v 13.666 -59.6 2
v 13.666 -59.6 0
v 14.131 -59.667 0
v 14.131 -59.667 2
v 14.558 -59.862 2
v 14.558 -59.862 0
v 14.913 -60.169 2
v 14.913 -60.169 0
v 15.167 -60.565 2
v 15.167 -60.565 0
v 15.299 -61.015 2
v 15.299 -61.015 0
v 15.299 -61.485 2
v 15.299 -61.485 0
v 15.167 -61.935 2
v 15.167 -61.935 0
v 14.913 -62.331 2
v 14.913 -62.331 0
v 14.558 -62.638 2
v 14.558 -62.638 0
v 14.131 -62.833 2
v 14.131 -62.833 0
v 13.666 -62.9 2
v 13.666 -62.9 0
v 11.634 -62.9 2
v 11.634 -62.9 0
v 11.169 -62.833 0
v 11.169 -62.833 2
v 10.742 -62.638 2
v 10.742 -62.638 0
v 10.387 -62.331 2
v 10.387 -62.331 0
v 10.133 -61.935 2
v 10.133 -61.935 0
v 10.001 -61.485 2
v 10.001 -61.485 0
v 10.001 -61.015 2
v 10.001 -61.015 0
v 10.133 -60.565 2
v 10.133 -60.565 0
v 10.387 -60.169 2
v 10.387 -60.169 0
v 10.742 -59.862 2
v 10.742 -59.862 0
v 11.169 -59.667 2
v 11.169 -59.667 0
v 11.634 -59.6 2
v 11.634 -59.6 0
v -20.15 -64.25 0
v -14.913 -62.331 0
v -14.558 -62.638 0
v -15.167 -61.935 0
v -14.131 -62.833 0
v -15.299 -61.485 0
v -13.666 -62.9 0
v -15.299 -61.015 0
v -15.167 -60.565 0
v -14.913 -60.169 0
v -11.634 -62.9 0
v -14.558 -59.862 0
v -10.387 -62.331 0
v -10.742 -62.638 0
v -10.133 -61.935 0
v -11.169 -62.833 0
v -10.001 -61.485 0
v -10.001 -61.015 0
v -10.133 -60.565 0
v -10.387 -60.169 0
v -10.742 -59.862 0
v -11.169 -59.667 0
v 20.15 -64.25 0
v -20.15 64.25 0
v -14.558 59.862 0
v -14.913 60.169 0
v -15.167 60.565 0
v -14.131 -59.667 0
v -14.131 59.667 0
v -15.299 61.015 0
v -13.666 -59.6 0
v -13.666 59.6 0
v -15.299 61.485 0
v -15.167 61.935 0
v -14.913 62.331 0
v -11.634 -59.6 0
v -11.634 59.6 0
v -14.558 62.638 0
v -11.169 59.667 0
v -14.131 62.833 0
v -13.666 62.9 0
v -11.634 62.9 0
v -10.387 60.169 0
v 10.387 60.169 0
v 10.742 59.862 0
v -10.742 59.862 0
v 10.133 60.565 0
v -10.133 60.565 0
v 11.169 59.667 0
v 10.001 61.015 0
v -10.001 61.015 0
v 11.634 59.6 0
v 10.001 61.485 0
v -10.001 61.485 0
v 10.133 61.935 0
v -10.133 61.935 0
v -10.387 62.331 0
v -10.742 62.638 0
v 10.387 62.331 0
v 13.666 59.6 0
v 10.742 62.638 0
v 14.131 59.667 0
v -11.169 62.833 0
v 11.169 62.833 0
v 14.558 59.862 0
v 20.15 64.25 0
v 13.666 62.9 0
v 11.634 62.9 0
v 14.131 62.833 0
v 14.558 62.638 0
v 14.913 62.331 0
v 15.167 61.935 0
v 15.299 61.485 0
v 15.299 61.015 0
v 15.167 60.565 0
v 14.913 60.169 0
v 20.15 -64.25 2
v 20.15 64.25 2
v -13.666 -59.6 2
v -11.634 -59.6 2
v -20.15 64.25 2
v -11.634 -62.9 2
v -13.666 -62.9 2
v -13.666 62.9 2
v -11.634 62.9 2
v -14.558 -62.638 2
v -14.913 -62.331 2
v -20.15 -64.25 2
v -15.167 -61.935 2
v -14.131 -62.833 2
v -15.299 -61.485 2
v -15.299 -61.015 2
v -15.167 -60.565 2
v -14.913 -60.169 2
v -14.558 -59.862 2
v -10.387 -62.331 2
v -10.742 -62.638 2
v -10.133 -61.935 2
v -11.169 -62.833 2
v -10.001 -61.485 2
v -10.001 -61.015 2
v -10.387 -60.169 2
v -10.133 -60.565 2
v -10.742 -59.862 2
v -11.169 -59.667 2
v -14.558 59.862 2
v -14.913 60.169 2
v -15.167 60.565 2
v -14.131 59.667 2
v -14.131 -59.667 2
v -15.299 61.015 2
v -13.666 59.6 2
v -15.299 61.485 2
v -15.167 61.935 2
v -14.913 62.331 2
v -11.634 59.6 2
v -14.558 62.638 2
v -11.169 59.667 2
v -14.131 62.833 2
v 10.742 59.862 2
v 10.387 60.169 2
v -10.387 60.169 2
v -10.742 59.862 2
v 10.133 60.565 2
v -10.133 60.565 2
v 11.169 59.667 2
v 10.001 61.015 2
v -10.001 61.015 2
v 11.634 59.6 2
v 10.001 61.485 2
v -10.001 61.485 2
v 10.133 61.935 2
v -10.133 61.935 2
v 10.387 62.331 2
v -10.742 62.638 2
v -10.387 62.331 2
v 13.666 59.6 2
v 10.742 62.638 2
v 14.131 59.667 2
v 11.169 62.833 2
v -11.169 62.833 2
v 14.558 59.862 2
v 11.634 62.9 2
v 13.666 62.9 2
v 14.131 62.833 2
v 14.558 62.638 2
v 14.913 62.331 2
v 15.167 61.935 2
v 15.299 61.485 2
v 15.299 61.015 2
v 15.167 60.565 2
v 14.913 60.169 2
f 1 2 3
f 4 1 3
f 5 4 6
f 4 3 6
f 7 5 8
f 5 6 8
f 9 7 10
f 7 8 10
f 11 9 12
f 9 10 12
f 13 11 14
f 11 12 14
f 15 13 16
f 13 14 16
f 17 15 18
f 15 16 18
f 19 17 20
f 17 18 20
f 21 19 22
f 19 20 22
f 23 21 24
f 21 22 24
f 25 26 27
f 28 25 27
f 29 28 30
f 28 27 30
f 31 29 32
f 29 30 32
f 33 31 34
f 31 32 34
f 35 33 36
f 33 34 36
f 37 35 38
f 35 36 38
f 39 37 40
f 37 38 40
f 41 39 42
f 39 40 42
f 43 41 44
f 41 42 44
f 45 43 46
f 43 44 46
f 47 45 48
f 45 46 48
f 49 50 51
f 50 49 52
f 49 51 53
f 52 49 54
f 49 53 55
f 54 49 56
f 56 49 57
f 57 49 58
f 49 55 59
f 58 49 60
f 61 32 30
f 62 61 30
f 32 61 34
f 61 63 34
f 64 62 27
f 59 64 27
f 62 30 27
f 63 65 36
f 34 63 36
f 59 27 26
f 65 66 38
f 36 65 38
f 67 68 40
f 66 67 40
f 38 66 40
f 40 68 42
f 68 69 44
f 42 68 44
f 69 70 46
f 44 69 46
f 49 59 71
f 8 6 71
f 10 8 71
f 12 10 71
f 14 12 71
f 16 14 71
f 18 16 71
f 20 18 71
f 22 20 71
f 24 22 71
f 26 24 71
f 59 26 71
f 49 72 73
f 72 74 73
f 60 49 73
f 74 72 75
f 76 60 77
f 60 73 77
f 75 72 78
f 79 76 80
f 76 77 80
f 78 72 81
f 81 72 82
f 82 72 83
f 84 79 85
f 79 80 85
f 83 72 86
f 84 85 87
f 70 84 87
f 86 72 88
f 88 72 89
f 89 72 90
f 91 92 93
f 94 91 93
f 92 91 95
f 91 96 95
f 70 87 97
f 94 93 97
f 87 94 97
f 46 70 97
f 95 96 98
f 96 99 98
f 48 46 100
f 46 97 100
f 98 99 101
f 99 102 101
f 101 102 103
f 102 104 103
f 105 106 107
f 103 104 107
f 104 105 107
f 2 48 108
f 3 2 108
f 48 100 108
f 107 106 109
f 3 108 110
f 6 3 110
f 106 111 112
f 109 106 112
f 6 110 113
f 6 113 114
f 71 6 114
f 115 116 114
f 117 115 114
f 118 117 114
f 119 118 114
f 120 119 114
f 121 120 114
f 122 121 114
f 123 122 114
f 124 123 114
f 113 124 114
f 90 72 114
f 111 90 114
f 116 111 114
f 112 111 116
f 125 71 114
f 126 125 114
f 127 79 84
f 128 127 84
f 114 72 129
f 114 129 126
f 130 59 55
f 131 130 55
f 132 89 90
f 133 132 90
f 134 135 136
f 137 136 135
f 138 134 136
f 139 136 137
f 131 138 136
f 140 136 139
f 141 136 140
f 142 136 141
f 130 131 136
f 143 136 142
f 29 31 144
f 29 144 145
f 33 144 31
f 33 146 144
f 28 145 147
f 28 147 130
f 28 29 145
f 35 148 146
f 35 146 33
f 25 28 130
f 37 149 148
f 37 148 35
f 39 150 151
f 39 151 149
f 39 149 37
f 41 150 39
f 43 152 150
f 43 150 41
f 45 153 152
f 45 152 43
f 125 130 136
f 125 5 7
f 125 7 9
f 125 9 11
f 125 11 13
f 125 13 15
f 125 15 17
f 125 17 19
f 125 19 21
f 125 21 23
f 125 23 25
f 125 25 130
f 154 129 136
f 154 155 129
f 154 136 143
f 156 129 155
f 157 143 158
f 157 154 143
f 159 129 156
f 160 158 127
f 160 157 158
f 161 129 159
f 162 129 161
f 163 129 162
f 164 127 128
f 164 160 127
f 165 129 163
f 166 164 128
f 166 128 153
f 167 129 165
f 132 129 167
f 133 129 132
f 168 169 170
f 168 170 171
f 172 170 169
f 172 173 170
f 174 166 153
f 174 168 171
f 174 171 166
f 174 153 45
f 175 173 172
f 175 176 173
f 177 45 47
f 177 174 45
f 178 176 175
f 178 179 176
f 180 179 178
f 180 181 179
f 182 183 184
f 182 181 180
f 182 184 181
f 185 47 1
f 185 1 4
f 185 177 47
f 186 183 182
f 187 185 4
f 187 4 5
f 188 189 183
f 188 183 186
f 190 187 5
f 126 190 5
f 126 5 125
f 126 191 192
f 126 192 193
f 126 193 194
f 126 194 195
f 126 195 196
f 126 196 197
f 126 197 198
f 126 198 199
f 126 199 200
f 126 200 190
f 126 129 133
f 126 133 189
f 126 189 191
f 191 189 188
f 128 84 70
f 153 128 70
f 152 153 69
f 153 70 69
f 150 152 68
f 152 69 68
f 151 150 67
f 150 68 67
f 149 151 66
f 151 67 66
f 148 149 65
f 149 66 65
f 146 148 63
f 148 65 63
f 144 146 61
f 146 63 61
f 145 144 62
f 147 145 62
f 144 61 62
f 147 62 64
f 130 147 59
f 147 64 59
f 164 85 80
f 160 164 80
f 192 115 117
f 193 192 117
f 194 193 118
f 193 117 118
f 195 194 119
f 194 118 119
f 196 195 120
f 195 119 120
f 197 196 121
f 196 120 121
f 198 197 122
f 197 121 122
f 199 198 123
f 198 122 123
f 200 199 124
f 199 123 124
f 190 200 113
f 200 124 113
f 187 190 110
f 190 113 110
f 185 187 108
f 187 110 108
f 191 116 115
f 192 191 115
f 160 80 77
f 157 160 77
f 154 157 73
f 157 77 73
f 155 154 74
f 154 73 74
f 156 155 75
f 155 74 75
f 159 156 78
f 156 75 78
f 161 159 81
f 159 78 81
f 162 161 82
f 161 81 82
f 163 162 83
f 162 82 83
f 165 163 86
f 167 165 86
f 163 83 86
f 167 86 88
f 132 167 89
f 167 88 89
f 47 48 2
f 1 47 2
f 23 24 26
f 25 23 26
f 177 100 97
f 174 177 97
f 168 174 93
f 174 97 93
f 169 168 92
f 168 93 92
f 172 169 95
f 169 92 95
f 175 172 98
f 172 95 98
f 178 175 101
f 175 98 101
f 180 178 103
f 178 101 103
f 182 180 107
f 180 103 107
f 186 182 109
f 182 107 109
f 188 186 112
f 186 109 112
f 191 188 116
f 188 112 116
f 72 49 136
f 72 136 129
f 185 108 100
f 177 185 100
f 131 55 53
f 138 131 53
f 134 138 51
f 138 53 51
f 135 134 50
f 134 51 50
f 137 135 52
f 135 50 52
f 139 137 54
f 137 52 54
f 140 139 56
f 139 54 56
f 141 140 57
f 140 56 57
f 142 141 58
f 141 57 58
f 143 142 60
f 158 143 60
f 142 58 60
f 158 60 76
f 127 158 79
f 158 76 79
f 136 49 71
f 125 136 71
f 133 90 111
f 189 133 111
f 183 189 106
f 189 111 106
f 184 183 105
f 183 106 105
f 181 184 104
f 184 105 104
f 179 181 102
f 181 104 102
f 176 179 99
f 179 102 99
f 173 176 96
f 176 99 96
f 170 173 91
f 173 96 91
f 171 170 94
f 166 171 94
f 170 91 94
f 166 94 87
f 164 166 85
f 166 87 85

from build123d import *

# Parameters (mm, degrees)
SKETCH1_W           = 40.3
SKETCH1_H           = 128.5
BOSS_EXTRUDE1_DEPTH = 2


with BuildPart() as part:
    # Sketch1 → Boss-Extrude1 (new body)
    with BuildSketch(Plane.XY):
        Rectangle(SKETCH1_W, SKETCH1_H)
        with BuildLine():
            Line((-13.666, -59.6), (-11.634, -59.6))
            ThreePointArc((-11.634, -59.6), (-9.984, -61.25), (-11.634, -62.9))
            Line((-11.634, -62.9), (-13.666, -62.9))
            ThreePointArc((-13.666, -62.9), (-15.316, -61.25), (-13.666, -59.6))
        make_face(mode=Mode.SUBTRACT)
        with BuildLine():
            Line((-13.666, 62.9), (-11.634, 62.9))
            ThreePointArc((-11.634, 62.9), (-9.984, 61.25), (-11.634, 59.6))
            Line((-11.634, 59.6), (-13.666, 59.6))
            ThreePointArc((-13.666, 59.6), (-15.316, 61.25), (-13.666, 62.9))
        make_face(mode=Mode.SUBTRACT)
        with BuildLine():
            Line((11.634000014, 62.9), (13.666000014, 62.9))
            ThreePointArc((13.666000014, 62.9), (15.316000014, 61.25), (13.666000014, 59.6))
            Line((13.666000014, 59.6), (11.634000014, 59.6))
            ThreePointArc((11.634000014, 59.6), (9.984000014, 61.25), (11.634000014, 62.9))
        make_face(mode=Mode.SUBTRACT)
        with BuildLine():
            Line((11.634000014, -59.6), (13.666000014, -59.6))
            ThreePointArc((13.666000014, -59.6), (15.316000014, -61.25), (13.666000014, -62.9))
            Line((13.666000014, -62.9), (11.634000014, -62.9))
            ThreePointArc((11.634000014, -62.9), (9.984000014, -61.25), (11.634000014, -59.6))
        make_face(mode=Mode.SUBTRACT)
    extrude(amount=BOSS_EXTRUDE1_DEPTH)


solid = part.part
